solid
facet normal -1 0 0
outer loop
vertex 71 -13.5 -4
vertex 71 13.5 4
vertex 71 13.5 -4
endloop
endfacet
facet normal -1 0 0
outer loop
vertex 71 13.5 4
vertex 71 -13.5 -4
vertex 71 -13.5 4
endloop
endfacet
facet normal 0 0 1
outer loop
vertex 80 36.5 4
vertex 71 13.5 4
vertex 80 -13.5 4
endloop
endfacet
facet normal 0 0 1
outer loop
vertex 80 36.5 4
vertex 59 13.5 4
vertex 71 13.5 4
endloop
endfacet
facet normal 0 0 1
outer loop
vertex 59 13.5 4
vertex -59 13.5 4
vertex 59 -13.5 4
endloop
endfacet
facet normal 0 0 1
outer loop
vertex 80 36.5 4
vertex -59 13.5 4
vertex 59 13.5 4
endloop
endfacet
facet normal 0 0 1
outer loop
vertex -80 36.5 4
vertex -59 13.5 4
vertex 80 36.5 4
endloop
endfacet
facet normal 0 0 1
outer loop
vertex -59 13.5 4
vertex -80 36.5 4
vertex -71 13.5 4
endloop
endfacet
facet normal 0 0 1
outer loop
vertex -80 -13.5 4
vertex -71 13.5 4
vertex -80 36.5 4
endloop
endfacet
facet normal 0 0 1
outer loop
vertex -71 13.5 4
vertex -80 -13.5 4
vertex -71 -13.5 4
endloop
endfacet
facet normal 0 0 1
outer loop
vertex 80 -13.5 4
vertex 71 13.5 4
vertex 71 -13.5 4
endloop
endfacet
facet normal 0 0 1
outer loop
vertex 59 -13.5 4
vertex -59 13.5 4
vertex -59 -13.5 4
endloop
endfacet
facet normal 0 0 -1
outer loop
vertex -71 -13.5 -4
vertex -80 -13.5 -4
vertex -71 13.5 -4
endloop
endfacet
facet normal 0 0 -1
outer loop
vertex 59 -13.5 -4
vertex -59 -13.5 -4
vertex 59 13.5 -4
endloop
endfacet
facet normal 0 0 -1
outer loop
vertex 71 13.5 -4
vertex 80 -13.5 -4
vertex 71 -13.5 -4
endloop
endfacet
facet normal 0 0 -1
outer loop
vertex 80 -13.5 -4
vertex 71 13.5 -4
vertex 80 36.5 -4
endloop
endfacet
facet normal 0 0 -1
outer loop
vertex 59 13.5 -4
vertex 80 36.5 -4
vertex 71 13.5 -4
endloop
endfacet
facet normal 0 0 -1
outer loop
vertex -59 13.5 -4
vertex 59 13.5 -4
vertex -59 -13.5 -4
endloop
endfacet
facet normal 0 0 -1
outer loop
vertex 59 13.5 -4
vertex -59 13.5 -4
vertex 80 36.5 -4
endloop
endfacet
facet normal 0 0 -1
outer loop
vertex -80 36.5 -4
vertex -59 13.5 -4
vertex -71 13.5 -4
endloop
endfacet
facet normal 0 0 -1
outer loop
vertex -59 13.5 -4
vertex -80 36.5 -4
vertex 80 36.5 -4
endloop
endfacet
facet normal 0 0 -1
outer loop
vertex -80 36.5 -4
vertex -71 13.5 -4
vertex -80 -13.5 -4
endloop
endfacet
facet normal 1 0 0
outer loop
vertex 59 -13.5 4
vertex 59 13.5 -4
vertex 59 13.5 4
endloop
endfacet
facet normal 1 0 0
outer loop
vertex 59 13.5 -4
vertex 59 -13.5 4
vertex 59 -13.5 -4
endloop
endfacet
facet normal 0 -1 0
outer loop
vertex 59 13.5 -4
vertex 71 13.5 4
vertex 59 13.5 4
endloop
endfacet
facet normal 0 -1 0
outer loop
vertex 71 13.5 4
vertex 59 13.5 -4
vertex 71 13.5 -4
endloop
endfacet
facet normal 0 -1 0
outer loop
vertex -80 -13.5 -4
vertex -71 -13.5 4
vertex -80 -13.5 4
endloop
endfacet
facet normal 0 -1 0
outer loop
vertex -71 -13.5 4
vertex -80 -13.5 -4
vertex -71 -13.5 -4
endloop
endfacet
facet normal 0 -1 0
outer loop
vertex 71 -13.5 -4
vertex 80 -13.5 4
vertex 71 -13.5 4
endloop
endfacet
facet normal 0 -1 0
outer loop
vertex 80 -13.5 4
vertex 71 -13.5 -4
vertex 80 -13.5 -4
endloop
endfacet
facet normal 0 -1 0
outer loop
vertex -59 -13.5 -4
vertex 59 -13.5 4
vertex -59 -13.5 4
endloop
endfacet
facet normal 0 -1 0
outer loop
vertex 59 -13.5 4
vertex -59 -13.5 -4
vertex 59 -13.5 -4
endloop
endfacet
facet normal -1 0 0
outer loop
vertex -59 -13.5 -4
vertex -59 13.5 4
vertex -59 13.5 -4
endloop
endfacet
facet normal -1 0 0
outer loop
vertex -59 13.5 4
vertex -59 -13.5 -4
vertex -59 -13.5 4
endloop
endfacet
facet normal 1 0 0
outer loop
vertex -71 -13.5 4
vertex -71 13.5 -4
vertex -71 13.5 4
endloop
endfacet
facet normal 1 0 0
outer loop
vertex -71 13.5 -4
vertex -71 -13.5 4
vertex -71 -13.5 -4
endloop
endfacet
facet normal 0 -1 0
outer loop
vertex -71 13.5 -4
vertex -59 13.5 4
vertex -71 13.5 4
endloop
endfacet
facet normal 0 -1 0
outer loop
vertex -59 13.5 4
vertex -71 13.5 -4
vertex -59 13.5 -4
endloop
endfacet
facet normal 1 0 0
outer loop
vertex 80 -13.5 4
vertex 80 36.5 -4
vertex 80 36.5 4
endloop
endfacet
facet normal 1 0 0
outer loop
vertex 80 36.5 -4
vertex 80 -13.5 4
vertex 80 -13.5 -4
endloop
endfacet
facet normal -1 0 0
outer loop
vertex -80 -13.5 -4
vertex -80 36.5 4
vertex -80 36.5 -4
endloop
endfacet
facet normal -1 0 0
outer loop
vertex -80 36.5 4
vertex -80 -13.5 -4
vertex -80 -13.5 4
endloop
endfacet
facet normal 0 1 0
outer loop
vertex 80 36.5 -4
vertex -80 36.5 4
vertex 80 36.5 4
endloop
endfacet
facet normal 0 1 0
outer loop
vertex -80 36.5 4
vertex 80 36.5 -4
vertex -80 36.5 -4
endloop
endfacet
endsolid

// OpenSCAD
// file: veriables.scad
aluminum_width			= 20;
wall_thickness			= 3;
depth						= 20;
smooth_rod				= 10;
long_bearing_od			= 19;
long_bearing_length		= 29;
bearing_outer			= 22;
bearing_inner			= 8;
bearing_thick				= 7;
screw_diamiter			= 4;
motor_width				= 42.5;
motor_screw_space		= 31;

hotend_gap				= 6;
hotend_gap_dia			= 12;
hotend_top				= 3;
hotend_top_dia			= 16;

x_rod_spacing			= 60;

aluminum_plate_thick	= 3;
// main file
include <veriables.scad>;

module added(){
	translate([0,50/2+(30-aluminum_plate_thick)/2-(30-aluminum_plate_thick),0]) cube([160,50,8],center=true);
}

module taken(){
	#translate([150/2-smooth_rod,0,0]) cube([12,30-aluminum_plate_thick,8],center=true);
	#translate([-150/2+smooth_rod,0,0]) cube([12,30-aluminum_plate_thick,8],center=true);
}

difference(){
	added();
	taken();
}
